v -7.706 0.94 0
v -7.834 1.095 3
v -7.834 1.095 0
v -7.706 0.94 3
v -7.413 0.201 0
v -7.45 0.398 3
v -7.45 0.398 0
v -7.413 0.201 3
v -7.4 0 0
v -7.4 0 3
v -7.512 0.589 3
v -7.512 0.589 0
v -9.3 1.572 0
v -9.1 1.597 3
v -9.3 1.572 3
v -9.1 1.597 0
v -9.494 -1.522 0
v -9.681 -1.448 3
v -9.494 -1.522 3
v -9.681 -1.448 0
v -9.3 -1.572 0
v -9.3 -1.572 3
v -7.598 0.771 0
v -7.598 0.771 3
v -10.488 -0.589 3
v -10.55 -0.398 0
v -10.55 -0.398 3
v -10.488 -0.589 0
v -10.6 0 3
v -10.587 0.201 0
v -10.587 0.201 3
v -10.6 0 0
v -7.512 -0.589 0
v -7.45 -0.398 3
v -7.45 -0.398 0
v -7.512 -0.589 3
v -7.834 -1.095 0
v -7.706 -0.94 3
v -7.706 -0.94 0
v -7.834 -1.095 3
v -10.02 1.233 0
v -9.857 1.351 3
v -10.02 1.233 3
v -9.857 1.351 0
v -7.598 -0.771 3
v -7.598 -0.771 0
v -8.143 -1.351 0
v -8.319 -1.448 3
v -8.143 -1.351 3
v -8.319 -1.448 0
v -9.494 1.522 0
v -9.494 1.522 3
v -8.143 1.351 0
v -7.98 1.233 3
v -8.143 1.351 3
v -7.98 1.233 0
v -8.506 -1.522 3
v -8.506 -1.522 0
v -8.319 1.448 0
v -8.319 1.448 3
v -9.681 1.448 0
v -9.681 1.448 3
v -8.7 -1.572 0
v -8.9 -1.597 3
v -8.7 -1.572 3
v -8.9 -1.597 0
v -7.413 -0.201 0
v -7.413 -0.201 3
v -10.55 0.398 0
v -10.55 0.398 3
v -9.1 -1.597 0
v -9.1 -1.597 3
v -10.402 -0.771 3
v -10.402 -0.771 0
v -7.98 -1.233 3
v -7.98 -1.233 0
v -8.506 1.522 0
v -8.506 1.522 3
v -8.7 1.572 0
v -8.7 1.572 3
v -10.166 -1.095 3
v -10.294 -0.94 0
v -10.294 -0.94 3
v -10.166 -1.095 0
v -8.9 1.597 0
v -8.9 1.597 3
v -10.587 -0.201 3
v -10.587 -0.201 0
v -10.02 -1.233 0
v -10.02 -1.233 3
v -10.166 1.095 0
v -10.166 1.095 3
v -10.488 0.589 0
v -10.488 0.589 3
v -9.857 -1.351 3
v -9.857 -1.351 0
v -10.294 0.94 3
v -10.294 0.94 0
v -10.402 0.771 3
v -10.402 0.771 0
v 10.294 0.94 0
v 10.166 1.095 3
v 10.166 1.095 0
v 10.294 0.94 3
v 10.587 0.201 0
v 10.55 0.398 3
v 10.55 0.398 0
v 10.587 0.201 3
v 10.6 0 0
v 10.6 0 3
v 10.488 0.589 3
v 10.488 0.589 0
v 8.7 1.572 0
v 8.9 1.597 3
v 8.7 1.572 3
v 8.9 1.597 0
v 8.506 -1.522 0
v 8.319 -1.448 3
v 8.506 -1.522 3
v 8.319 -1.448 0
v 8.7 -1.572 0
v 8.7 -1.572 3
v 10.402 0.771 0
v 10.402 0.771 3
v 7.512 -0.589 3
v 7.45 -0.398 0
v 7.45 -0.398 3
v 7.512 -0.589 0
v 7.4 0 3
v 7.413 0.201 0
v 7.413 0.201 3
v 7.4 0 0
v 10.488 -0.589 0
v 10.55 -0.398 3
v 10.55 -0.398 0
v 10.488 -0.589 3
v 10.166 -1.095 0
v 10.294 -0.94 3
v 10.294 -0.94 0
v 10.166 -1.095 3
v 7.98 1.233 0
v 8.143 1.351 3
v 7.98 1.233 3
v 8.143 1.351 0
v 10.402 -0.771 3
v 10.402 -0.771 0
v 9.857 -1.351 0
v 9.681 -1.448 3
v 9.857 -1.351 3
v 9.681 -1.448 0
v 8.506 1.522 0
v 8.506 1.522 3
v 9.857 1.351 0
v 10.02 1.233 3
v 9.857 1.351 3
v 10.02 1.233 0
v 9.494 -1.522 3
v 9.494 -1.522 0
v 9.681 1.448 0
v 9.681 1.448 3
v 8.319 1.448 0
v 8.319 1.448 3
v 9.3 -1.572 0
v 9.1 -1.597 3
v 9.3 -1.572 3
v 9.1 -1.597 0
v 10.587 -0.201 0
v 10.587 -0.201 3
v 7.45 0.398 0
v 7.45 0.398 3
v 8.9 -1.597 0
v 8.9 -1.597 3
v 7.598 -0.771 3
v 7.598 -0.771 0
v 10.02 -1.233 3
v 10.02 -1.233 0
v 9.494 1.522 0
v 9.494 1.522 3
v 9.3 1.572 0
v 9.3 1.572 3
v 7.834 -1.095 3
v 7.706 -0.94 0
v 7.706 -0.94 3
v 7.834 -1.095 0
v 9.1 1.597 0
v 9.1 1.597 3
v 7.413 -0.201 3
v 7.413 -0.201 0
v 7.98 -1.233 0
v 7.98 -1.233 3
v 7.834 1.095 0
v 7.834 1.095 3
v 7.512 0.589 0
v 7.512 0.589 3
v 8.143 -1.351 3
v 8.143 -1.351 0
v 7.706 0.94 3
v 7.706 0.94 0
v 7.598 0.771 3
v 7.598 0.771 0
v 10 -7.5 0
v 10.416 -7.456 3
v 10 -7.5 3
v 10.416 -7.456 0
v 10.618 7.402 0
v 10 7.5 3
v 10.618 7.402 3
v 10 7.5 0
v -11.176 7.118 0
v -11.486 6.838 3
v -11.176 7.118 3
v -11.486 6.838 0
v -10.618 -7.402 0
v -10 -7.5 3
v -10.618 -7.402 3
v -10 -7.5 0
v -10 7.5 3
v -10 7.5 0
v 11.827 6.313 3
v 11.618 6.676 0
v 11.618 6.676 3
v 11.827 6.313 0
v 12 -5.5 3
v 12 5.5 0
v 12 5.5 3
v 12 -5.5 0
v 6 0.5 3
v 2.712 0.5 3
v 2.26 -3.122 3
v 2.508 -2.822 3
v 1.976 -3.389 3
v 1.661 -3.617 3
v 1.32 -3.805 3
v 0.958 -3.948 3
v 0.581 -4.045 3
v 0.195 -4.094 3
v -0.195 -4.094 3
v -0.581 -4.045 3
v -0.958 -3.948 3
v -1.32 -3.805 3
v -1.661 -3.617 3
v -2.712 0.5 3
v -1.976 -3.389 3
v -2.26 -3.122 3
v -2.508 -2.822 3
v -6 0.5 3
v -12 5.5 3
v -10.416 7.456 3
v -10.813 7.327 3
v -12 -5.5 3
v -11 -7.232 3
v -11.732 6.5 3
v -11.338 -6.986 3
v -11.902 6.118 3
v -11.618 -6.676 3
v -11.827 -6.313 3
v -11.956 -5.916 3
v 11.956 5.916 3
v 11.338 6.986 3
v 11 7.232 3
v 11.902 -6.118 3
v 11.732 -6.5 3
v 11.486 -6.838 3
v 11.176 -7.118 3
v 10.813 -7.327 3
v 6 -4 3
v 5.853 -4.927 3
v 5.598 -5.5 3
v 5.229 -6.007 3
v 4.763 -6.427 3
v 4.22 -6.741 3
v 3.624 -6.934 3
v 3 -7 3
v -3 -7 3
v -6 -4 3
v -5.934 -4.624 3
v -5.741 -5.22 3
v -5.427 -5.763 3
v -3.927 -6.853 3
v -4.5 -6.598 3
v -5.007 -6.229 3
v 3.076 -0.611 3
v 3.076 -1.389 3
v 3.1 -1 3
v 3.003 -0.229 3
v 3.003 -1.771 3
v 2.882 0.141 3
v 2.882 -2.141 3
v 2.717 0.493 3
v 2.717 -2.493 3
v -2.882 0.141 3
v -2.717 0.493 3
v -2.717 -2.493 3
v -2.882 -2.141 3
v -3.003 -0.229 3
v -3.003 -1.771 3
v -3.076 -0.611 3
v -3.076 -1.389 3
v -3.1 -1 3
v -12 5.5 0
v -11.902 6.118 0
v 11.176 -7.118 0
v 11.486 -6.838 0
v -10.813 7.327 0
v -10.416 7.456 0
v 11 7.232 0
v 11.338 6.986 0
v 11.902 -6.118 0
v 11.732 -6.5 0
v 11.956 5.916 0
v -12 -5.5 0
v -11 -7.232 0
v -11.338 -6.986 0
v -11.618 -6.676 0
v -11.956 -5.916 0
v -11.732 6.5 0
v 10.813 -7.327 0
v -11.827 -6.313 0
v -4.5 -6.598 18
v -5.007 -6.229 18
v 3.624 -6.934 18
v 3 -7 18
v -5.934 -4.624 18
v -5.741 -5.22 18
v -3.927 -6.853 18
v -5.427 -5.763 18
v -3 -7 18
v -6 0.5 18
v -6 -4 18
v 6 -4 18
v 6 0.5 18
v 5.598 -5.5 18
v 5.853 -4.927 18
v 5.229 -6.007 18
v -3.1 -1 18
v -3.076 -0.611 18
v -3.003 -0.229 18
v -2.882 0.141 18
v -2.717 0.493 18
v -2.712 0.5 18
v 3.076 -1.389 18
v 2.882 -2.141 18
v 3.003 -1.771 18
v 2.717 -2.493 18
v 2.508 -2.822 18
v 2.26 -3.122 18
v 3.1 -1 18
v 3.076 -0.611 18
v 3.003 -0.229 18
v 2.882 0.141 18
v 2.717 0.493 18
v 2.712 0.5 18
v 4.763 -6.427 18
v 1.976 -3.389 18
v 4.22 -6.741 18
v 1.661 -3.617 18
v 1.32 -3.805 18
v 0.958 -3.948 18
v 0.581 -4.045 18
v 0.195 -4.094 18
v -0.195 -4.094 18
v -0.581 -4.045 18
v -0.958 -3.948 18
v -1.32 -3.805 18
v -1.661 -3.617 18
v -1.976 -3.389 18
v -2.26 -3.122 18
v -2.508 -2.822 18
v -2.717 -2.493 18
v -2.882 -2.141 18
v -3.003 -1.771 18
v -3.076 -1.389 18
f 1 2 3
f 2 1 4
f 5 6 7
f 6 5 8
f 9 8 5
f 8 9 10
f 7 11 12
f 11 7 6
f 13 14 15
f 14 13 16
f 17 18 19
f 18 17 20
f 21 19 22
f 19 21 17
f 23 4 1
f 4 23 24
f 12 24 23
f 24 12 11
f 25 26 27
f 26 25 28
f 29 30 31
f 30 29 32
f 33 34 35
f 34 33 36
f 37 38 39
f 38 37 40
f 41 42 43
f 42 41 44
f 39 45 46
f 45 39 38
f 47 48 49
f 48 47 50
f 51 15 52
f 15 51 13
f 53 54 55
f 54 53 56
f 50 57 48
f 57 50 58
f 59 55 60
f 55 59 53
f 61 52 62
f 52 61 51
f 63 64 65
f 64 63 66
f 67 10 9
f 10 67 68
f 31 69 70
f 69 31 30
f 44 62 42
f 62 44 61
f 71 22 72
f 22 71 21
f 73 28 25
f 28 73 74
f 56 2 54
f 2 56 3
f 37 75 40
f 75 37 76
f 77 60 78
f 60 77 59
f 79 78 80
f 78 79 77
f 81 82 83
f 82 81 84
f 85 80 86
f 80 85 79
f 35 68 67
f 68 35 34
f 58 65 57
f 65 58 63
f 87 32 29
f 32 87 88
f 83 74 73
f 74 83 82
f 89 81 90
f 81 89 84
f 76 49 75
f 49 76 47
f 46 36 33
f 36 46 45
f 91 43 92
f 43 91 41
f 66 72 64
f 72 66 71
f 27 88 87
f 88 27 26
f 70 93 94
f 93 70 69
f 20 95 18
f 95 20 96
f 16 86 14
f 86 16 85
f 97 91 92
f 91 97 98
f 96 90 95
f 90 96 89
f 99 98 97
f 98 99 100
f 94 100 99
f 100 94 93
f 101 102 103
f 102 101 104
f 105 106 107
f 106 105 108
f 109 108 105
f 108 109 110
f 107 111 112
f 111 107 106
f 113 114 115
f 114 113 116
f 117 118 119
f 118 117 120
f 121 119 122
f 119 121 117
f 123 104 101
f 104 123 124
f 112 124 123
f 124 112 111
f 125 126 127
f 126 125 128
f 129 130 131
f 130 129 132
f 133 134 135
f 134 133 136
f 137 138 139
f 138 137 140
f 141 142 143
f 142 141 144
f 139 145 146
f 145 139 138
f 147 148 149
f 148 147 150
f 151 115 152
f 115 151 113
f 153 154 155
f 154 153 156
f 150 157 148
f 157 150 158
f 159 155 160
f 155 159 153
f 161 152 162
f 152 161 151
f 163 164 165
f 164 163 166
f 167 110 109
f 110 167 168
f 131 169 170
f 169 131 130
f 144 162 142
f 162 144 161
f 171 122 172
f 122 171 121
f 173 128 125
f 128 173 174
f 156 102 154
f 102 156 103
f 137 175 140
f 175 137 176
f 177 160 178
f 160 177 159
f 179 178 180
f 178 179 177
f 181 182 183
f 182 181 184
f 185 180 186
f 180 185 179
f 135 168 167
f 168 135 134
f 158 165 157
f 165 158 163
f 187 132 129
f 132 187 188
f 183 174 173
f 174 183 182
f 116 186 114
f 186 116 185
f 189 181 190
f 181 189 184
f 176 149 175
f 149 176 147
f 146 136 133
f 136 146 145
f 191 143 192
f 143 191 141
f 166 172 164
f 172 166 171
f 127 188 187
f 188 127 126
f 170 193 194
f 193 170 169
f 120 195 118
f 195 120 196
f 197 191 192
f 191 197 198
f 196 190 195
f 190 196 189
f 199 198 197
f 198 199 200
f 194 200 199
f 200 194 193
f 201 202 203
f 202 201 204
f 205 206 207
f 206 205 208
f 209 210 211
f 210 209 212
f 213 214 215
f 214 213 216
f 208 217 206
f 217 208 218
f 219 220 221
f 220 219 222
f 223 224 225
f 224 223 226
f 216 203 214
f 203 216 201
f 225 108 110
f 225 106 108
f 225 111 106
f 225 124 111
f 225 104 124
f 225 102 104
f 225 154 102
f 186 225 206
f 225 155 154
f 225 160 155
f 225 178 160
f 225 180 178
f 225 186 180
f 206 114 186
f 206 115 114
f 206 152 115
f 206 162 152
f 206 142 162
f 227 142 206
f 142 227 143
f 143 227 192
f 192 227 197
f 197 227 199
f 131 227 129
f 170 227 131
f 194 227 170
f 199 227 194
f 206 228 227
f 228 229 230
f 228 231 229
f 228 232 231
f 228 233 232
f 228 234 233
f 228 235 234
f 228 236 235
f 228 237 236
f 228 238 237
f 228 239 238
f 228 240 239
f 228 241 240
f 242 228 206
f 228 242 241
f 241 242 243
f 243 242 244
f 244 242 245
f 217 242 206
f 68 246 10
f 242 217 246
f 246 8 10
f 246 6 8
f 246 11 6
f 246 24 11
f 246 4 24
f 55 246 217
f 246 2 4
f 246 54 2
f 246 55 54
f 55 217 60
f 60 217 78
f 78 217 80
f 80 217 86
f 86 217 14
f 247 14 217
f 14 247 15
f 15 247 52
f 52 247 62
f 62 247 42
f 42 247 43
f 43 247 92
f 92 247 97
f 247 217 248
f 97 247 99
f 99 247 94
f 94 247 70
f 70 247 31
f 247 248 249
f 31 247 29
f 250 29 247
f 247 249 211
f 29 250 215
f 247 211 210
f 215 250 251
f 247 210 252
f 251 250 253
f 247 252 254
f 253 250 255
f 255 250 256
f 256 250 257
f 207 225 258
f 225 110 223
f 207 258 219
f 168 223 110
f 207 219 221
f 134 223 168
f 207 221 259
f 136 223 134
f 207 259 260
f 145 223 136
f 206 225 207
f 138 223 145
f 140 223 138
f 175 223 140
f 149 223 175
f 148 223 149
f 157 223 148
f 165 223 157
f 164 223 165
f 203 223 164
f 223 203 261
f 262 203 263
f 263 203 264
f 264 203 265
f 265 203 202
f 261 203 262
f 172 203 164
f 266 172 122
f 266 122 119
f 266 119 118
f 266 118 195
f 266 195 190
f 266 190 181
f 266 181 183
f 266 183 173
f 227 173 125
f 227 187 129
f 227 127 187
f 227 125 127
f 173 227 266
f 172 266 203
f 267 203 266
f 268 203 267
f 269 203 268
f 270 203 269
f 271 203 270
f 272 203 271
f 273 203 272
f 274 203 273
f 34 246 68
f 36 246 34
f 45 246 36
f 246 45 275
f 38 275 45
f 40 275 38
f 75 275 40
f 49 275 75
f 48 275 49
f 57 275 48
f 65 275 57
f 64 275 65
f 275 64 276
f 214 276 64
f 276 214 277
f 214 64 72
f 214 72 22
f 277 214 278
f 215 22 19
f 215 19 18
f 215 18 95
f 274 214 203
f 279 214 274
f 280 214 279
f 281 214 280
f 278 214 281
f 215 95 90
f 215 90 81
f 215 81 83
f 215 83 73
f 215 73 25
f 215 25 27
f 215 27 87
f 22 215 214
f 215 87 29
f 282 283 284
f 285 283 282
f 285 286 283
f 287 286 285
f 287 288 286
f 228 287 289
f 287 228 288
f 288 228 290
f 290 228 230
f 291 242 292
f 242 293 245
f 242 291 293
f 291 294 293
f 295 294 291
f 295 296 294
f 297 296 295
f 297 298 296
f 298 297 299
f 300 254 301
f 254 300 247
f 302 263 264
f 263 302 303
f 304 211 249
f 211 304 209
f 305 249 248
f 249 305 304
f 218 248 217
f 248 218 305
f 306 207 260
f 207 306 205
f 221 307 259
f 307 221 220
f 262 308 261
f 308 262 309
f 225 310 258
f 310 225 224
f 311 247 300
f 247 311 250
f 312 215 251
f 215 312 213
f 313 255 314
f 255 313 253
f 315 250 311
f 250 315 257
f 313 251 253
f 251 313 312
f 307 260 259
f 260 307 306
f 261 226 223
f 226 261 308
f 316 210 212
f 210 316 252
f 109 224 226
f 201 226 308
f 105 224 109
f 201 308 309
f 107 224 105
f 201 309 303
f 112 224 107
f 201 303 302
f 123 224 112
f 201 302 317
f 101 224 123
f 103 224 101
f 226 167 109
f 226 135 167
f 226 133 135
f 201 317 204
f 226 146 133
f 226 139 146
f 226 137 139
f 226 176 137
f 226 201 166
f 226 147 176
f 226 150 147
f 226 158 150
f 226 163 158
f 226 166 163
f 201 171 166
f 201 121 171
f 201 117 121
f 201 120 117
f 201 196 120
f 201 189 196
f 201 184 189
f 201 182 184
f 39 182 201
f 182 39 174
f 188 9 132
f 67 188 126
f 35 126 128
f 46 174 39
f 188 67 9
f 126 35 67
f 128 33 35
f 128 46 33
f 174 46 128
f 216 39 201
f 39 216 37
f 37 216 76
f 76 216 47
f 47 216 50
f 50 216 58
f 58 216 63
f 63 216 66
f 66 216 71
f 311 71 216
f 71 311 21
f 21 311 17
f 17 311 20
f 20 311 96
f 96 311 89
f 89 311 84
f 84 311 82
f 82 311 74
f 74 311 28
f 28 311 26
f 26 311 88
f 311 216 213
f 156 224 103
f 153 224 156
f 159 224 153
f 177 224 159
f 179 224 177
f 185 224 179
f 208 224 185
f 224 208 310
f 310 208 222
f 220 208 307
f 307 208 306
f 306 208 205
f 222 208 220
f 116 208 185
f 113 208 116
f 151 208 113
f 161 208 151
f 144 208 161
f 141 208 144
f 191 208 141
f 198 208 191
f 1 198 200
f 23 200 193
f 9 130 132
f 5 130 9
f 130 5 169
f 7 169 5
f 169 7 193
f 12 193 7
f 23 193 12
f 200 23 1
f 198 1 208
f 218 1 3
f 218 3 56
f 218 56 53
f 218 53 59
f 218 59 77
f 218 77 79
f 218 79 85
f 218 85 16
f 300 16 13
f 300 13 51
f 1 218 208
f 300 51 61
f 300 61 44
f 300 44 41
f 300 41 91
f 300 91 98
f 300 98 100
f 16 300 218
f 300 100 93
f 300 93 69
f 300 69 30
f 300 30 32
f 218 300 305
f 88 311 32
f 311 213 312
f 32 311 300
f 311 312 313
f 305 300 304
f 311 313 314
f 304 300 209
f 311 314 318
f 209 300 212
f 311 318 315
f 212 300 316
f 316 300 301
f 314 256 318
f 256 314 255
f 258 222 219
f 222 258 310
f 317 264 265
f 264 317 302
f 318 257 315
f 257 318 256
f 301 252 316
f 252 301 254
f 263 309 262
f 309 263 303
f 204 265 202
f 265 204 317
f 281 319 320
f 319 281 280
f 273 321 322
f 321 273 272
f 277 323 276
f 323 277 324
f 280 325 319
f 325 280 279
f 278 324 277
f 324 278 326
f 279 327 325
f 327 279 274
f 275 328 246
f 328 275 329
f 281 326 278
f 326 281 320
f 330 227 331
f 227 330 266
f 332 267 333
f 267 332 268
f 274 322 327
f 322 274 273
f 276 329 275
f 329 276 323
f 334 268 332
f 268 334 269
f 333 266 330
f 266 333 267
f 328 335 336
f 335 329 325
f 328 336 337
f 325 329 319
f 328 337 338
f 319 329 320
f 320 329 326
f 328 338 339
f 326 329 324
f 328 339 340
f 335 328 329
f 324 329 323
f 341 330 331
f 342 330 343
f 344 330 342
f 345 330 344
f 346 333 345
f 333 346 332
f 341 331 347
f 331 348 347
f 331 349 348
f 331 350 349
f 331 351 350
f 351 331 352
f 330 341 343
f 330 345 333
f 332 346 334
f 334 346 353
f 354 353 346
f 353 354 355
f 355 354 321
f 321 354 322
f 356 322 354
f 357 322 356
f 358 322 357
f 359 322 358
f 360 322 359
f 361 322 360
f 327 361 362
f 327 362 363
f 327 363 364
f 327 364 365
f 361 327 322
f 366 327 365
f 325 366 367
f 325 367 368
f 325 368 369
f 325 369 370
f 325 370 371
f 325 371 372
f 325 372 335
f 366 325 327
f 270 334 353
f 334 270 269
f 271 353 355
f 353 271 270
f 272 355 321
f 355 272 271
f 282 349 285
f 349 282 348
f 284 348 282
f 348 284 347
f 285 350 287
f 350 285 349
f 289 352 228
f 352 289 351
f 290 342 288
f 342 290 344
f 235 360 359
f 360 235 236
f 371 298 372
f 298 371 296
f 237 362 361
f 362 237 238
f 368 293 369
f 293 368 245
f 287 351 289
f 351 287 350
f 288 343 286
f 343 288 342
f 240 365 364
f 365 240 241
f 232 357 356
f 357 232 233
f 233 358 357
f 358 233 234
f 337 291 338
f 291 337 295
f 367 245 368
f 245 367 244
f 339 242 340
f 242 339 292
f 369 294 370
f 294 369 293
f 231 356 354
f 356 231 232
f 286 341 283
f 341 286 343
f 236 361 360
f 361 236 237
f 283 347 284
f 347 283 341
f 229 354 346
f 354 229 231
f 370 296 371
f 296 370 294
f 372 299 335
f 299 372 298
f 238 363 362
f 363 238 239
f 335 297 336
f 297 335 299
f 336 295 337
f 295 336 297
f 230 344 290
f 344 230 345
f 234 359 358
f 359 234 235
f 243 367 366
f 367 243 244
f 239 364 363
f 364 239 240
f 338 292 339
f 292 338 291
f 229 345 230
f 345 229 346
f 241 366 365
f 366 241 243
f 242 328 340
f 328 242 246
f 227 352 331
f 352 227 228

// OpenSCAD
// file: lib/libminifolda.scad
//------------------------------------------------------------
//--    3D printed pieces for Mini Foldarap 3D printer
//------------------------------------------------------------
// (copyleft) 2018-2019 Isidoro Gayo Vélez 
// <isidoro.gayo@gmail.com>

// Credits:
//-- Enmanuel Gillot

//------------------------------------------------------------
//-- Released under the terms of GNU/GPL v3.0 or higher
//------------------------------------------------------------


module mini_board_holder(profile=wslot,rd=4){
    
    difference(){
        hull(){
            for(x=[5,-11]){
                translate([x,0,0])
                    cylinder(h=profile+2*thwall,r=rd);
            }
        }
        // M3 fixing slot screw
        translate([-profile/2,0,-1])
            cylinder(h=profile+thwall+2,r=1.6);
        // M3 fixing board screw
        #translate([0,0,1.4*profile])
        rotate([0,15,0]){
            translate([-0.5*profile,-profile/2,0])
                cube([2*profile,profile,profile]);
            translate([5,0,-5.5])
                cylinder(h=6,r=1.3);
        }
        // room for slot
        translate([-profile-1,-rd,thwall])
            cube([profile+1,2*rd,profile+thwall+2]);
    }
    // fake aluminium profile
    %translate([-profile,-25,thwall])
        cube([profile,50,profile]);
    // fake board
    %translate([0,-50,profile+3])
    rotate([0,15,0])
        cube([70,100,2]);
}


module PSU_switch_plate(hg=span+2*wslot,wd=50){
    
// hg = plate size from top to bottom in mm
// wd = plate size from left to right in mm
    ws=13;  // switch widht in mm
    ls=19;  // switch lenght in mm
    rp=4; // power plug radius in mm
    
    difference(){
        // base plate
        linear_extrude(height=thwall)
        offset(delta=3,chamfer=true)
            square([wd-6,hg-6],center=true);
        // room for power switch
        translate([-1.5*ws,-ls/2-3,-1])union(){
            translate([0,3,0])
            linear_extrude(height=thwall+2)
                square([ws+ease,ls+ease]);            
            translate([0,0,2])cube([ws+ease,ease+ls+6,thwall]);
        }
        // drill for power plug
        translate([2.5*rp,0,-1])
        linear_extrude(height=thwall+2)
            // plug radius plus 0.1 mm
            circle(r=rp+0.1,$fn=30);
        translate([2.5*rp,0,1])
        linear_extrude(height=thwall+2)
            circle(r=rp+1.6,$fn=30);
        // M3 fixing screws
        for(x=[wd/2-8,-wd/2+8]){
            for(y=[(hg-wslot)/2,-(hg-wslot)/2]){
                translate([x,y,-1])cylinder(h=thwall+2,r=1.6,$fn=30);
            }
        }
    }
}
// main file
//------------------------------------------------------------
//---- 3D printed pieces for Scalable Foldarap 3D printer ----
//------------------------------------------------------------
// (c) 2018-2019 Isidoro Gayo Vélez (isidoro.gayo@gmail.com)

// Credits:
// -- Enmanuel Gillot, for his superb fodable 3D printer

//------------------------------------------------------------
//      Released under the terms of GNU/GPL v3.0 or higher
//------------------------------------------------------------

include <lib/core.scad>
include <lib/misc.scad>
include <lib/X_axis.scad>
include <lib/Y_axis.scad>
include <lib/Z_axis.scad>
include <lib/extruder.scad>
include <lib/libminifolda.scad>


// Parameters to modify. 
// Try to NOT modify variables in other places.
NEMA14=34;      // NEMA14 width in mm
NEMA17=42;      // NEMA17 width in mm
wslot=15;		// aluminium slot width
lslot=wslot;     // aluminium slot height in mm
thwall=3.5;     // wall thickness
span=NEMA17;    // span between horizontal profiles on Y axis
footl=2.5*wslot;// foot lenght
ease=0.2;       // clearance to fit the aluminum profile easier
stepper=14;     // NEMA stepper type to be used

lbearing=19;    // bearing lenght in mm
rbearing=6;     // bearing radius in mm
rrod=3;         // smooth rod radius in mm
drod=87;        // distance between Y rods in mm
bhole=100/2;  // M3 hole distance from bed center


$fn=50;



  
// --------- MiniFolda parts --------


// ========
//  X axis
// ========

//mirror([0,1,0])
//translate([-3*thwall-wslot,2*thwall+wslot,0])
    //x_motor_idler(ssize=3,bowden=true);

//mirror([0,1,0])
    //x_motor_holder(hg=NEMA17,ssize=3,daxis=32,thick=6.5);

//x_carriage(daxis=32);

//extruder_wire_fastener();

//rotate([0,180,0])
  //  x_wire_fastener();

//x_endstop_holder();
//knob(thk=4,dia=12,nk=8,dk=3);

//rotate([-90,0,0])
    //sync_bearing_holder();
//knob(thk=8,dia=10,nk=8,dk=2);




// ========
//  Y axis
// ========

//mirror([0,1,0])
  //  foot();

//mini_board_holder();

//mirror()
  //  y_motor_holder(thick=10,mt=3);
/*
%translate([-50,(span+2*wslot-6)/2-wslot/2+3-wslot/2,5])
cube([100,wslot,wslot]);*/
//y_motor_idler(mt=3);
//knob(thk=8,dia=12,nk=8,dk=2.5);

//rotate([-90,0,0])
  //  sync_bearing_holder();

y_rod_holder(bl=24,mt=3);

//y_bearing_clamp(h=18);

//translate([0,0,6])
    //frog();

//PSU_switch_plate();

//y_endstop_adj(hg=35,mt=3);
//knob(thk=4,dia=12,nk=8,dk=3);

/*
difference(){
y_belt_clamp(cs=2*lbearing+4,ch=22,bthk=0.9);
translate([0,-5,-1])
    hollow(lg=16,wd=10,rd=2,hg=14);
}
*/




// ========
//  Z axis
// ========

//mirror([0,1,0])
  //  z_motor_holder(mt=3);

//z_upper_joint(mt=3);

//rotate([-90,0,0])
  //  z_hinge_outter(bsd=6,ssd=5,mt=3);
//z_hinge_inner(lg=50,sw=3,mt=3);




// ==============
//  Miscelaneous
// ==============

//handle(lg=70,mt=3);




// ==========
//  Extruder
// ==========

//hotend_holder();    
//hotend_holder_collar();





// --------- EoMF parts --------




// -------- Models --------

/*
// Y motor idler full
translate([80,0,10])
rotate([0,-90,0]){
    translate([-6.5,13,20])
    rotate([0,90,0])
        sync_bearing_holder();
    y_motor_idler(mt=3);
}
*/

/*
// Extruder Bowden Holder
translate([-20,20,-39])
rotate([90,0,0])
    hotend_holder();    
hotend_holder_collar();

%translate([0,0,-7.8])
    rotate([-90,180,0])
    import("aux/mylite6.stl");
*/


/* 
// Frog + Bearing clamps
translate([0,0,6])
    frog();

for(x=[[0,-drod/2],[180,-drod/2]]){
    rotate([0,0,x[0]])
    translate([x[1],lbearing,-2.8])
    rotate([90,0,0])
        y_bearing_clamp();
} 
*/

/*
// Y motor holder + stepper
y_motor_holder(thick=10,mt=3);
translate([0,0,-5])
nema_motor(stepper=14);

y_motor_pulley();

translate([40,20,0])
y_belt_clamp();

translate([-2,28,-5])
rotate([0,90,0])
y_rod_holder();
*/


// ------- EoM ---------
